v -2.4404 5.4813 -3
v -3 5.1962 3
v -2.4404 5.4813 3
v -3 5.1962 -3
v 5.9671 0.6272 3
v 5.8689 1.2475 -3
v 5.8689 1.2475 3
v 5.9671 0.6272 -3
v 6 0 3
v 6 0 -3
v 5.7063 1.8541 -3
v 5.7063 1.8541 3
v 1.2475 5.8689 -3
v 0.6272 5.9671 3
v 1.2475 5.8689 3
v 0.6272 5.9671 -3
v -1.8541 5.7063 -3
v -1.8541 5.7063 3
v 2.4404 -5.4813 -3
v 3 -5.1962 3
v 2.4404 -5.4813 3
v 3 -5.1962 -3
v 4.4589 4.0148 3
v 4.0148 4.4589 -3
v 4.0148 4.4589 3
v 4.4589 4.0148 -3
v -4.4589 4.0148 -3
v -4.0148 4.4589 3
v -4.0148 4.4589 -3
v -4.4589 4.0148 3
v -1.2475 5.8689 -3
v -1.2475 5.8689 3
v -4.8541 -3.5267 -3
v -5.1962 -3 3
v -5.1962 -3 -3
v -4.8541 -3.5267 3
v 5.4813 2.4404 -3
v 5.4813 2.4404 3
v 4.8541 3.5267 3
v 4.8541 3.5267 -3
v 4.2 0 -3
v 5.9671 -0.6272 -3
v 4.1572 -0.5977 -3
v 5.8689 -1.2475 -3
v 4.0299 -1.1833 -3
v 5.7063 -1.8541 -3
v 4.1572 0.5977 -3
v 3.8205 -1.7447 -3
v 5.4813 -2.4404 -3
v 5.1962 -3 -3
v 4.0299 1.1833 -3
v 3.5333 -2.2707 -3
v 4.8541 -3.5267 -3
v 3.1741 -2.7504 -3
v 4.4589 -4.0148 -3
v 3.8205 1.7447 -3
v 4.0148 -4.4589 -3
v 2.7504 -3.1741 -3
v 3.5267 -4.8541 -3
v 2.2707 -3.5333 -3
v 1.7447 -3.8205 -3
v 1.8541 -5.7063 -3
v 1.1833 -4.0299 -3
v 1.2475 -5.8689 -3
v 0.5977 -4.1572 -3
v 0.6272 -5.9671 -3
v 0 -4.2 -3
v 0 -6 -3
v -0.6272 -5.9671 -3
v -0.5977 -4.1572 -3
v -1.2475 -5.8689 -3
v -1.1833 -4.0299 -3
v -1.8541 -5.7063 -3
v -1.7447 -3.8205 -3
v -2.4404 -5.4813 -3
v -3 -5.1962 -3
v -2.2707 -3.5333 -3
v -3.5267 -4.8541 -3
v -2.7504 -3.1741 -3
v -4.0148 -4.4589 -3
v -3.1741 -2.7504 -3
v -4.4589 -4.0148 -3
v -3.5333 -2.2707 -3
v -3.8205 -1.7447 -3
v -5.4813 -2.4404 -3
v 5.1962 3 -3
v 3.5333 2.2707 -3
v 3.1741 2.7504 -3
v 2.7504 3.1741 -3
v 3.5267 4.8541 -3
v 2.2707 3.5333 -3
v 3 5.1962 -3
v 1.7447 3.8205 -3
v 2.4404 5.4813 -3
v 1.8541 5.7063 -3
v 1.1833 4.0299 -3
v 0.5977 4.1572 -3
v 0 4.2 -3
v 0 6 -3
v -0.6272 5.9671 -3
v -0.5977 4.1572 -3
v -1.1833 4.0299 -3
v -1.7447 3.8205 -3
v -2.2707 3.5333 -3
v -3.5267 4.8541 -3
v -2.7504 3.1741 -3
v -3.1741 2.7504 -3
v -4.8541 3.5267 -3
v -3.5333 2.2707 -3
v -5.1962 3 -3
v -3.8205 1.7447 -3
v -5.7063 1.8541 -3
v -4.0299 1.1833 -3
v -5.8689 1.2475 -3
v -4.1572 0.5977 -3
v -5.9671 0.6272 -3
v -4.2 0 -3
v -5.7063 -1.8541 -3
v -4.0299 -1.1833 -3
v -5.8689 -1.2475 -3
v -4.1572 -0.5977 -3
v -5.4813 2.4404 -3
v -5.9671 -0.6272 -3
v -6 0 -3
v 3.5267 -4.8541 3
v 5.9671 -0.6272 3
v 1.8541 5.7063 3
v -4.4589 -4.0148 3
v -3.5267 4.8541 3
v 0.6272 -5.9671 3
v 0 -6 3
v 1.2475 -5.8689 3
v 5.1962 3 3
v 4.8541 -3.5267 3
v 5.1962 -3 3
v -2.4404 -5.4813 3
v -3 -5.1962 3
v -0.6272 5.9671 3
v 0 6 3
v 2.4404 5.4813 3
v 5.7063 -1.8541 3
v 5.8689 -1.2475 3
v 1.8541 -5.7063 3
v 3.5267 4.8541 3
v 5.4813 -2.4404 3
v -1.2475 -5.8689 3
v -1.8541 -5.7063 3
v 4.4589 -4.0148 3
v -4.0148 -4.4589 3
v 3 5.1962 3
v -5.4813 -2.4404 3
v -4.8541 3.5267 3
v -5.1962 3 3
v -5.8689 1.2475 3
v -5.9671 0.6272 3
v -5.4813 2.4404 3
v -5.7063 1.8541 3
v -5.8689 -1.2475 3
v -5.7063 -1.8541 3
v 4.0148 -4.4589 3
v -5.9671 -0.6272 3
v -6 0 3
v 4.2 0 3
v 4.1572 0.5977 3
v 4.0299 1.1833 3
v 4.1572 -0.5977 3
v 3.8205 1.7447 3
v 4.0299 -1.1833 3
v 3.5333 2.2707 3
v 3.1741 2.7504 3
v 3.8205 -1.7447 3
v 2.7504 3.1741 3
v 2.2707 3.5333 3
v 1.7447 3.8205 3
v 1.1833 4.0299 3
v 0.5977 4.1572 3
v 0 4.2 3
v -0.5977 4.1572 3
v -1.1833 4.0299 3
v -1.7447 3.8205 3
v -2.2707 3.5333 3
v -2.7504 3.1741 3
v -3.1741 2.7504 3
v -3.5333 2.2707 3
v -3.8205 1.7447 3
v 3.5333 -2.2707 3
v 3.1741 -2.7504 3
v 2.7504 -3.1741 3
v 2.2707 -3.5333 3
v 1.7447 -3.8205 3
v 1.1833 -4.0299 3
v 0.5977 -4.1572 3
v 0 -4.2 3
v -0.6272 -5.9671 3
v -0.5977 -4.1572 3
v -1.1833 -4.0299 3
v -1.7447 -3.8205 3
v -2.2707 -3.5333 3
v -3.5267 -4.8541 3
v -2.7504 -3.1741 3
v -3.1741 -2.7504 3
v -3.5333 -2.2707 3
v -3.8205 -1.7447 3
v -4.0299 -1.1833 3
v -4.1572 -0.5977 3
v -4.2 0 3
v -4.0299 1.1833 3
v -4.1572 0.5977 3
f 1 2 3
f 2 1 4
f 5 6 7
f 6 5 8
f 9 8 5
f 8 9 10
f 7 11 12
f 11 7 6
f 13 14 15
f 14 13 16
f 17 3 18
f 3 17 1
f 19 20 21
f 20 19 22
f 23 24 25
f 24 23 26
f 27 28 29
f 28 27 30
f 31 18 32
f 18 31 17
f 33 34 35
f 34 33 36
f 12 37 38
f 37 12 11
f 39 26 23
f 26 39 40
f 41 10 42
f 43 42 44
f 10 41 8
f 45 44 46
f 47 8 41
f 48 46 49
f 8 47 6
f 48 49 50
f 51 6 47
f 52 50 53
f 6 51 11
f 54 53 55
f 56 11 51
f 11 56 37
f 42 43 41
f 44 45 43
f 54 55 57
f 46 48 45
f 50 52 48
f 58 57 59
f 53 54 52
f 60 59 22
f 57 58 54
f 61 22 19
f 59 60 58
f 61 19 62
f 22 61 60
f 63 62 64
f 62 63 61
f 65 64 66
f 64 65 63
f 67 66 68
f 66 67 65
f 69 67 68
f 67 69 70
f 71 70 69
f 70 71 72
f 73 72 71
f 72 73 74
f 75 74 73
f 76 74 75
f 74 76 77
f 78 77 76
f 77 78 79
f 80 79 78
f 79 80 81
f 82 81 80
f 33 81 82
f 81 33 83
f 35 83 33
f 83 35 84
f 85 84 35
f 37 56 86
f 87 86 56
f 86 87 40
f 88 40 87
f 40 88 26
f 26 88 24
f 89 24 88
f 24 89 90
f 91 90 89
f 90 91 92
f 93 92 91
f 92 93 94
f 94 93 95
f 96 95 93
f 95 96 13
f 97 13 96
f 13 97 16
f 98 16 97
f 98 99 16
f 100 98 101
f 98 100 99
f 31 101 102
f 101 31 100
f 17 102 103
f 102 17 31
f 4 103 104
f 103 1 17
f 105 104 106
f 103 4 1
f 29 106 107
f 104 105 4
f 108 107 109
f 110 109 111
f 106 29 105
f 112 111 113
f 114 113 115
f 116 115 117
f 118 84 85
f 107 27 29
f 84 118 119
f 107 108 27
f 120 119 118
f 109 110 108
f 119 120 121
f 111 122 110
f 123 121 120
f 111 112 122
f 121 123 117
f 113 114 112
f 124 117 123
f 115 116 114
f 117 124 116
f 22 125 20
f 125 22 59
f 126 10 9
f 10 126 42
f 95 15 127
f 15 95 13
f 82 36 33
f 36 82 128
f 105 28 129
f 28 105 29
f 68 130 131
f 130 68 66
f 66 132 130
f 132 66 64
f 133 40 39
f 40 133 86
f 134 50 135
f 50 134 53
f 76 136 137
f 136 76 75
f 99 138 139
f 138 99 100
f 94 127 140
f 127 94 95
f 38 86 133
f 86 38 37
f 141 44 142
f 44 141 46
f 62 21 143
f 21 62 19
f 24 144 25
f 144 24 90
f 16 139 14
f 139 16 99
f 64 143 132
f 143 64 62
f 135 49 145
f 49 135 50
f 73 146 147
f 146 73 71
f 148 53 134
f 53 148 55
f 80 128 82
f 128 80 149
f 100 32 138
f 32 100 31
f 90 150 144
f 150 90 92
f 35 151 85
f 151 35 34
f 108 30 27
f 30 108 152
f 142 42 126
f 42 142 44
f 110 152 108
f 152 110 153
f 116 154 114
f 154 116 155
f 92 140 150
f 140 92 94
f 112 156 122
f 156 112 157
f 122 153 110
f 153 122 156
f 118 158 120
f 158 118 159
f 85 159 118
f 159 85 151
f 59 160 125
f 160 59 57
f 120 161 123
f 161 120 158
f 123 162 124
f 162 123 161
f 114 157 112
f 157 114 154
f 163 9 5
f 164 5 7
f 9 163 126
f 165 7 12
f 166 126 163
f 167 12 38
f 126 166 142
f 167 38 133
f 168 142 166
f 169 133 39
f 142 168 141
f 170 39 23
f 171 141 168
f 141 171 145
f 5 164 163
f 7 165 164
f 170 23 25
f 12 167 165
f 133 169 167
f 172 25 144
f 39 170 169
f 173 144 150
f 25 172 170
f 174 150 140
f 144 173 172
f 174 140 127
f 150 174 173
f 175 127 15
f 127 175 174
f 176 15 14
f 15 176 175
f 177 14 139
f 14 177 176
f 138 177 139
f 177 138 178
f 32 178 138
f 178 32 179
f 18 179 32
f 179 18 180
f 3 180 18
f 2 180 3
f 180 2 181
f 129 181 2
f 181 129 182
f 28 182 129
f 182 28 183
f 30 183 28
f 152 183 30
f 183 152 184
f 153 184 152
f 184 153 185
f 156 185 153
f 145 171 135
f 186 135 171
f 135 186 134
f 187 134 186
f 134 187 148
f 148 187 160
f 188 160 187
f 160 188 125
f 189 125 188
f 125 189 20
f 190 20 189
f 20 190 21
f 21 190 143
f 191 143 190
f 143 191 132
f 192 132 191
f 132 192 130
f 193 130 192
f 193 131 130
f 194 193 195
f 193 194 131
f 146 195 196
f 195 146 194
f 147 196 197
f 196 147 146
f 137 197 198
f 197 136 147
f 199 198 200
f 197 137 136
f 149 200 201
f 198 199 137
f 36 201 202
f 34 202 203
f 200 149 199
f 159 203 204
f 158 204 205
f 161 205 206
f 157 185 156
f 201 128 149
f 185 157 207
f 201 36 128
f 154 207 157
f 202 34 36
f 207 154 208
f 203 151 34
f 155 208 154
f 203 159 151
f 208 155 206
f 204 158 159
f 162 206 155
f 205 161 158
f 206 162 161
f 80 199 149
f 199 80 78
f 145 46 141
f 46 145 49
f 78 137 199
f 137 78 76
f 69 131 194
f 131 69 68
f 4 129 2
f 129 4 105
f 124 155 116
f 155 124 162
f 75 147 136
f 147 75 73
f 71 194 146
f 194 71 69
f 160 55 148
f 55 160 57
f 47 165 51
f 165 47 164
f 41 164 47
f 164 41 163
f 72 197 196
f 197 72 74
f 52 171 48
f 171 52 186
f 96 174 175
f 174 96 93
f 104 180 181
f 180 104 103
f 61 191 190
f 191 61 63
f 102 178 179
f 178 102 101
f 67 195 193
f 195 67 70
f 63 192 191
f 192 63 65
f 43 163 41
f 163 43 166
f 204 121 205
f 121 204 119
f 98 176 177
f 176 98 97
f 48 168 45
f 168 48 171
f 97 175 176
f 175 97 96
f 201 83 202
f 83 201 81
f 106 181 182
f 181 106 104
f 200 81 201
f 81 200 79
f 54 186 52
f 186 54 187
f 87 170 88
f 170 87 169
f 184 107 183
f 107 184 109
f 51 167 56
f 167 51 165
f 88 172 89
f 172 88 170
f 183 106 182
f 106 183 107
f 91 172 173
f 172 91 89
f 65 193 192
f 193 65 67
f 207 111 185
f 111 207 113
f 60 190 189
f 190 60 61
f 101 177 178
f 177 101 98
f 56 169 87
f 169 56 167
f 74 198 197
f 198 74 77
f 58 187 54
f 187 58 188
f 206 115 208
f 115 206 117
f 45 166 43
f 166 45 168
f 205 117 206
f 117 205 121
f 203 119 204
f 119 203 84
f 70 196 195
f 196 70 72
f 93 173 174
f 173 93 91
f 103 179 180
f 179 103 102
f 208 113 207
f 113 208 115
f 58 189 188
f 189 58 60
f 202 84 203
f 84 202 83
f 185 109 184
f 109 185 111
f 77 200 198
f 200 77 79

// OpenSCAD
use <common.scad>

// 용어
// 1. 스페이서(spacer)
// 2. 외경(outer diameter)
// 3. 보어(bore)
// 4. 길이(length)

module spacer_od12_id8_4_l6(part_color = [1, 0, 0.8]) {
    spacer(od = 12,
           bore = 8.4,
           spacer_len = 6,
           part_color = part_color);
}

spacer_od12_id8_4_l6();
